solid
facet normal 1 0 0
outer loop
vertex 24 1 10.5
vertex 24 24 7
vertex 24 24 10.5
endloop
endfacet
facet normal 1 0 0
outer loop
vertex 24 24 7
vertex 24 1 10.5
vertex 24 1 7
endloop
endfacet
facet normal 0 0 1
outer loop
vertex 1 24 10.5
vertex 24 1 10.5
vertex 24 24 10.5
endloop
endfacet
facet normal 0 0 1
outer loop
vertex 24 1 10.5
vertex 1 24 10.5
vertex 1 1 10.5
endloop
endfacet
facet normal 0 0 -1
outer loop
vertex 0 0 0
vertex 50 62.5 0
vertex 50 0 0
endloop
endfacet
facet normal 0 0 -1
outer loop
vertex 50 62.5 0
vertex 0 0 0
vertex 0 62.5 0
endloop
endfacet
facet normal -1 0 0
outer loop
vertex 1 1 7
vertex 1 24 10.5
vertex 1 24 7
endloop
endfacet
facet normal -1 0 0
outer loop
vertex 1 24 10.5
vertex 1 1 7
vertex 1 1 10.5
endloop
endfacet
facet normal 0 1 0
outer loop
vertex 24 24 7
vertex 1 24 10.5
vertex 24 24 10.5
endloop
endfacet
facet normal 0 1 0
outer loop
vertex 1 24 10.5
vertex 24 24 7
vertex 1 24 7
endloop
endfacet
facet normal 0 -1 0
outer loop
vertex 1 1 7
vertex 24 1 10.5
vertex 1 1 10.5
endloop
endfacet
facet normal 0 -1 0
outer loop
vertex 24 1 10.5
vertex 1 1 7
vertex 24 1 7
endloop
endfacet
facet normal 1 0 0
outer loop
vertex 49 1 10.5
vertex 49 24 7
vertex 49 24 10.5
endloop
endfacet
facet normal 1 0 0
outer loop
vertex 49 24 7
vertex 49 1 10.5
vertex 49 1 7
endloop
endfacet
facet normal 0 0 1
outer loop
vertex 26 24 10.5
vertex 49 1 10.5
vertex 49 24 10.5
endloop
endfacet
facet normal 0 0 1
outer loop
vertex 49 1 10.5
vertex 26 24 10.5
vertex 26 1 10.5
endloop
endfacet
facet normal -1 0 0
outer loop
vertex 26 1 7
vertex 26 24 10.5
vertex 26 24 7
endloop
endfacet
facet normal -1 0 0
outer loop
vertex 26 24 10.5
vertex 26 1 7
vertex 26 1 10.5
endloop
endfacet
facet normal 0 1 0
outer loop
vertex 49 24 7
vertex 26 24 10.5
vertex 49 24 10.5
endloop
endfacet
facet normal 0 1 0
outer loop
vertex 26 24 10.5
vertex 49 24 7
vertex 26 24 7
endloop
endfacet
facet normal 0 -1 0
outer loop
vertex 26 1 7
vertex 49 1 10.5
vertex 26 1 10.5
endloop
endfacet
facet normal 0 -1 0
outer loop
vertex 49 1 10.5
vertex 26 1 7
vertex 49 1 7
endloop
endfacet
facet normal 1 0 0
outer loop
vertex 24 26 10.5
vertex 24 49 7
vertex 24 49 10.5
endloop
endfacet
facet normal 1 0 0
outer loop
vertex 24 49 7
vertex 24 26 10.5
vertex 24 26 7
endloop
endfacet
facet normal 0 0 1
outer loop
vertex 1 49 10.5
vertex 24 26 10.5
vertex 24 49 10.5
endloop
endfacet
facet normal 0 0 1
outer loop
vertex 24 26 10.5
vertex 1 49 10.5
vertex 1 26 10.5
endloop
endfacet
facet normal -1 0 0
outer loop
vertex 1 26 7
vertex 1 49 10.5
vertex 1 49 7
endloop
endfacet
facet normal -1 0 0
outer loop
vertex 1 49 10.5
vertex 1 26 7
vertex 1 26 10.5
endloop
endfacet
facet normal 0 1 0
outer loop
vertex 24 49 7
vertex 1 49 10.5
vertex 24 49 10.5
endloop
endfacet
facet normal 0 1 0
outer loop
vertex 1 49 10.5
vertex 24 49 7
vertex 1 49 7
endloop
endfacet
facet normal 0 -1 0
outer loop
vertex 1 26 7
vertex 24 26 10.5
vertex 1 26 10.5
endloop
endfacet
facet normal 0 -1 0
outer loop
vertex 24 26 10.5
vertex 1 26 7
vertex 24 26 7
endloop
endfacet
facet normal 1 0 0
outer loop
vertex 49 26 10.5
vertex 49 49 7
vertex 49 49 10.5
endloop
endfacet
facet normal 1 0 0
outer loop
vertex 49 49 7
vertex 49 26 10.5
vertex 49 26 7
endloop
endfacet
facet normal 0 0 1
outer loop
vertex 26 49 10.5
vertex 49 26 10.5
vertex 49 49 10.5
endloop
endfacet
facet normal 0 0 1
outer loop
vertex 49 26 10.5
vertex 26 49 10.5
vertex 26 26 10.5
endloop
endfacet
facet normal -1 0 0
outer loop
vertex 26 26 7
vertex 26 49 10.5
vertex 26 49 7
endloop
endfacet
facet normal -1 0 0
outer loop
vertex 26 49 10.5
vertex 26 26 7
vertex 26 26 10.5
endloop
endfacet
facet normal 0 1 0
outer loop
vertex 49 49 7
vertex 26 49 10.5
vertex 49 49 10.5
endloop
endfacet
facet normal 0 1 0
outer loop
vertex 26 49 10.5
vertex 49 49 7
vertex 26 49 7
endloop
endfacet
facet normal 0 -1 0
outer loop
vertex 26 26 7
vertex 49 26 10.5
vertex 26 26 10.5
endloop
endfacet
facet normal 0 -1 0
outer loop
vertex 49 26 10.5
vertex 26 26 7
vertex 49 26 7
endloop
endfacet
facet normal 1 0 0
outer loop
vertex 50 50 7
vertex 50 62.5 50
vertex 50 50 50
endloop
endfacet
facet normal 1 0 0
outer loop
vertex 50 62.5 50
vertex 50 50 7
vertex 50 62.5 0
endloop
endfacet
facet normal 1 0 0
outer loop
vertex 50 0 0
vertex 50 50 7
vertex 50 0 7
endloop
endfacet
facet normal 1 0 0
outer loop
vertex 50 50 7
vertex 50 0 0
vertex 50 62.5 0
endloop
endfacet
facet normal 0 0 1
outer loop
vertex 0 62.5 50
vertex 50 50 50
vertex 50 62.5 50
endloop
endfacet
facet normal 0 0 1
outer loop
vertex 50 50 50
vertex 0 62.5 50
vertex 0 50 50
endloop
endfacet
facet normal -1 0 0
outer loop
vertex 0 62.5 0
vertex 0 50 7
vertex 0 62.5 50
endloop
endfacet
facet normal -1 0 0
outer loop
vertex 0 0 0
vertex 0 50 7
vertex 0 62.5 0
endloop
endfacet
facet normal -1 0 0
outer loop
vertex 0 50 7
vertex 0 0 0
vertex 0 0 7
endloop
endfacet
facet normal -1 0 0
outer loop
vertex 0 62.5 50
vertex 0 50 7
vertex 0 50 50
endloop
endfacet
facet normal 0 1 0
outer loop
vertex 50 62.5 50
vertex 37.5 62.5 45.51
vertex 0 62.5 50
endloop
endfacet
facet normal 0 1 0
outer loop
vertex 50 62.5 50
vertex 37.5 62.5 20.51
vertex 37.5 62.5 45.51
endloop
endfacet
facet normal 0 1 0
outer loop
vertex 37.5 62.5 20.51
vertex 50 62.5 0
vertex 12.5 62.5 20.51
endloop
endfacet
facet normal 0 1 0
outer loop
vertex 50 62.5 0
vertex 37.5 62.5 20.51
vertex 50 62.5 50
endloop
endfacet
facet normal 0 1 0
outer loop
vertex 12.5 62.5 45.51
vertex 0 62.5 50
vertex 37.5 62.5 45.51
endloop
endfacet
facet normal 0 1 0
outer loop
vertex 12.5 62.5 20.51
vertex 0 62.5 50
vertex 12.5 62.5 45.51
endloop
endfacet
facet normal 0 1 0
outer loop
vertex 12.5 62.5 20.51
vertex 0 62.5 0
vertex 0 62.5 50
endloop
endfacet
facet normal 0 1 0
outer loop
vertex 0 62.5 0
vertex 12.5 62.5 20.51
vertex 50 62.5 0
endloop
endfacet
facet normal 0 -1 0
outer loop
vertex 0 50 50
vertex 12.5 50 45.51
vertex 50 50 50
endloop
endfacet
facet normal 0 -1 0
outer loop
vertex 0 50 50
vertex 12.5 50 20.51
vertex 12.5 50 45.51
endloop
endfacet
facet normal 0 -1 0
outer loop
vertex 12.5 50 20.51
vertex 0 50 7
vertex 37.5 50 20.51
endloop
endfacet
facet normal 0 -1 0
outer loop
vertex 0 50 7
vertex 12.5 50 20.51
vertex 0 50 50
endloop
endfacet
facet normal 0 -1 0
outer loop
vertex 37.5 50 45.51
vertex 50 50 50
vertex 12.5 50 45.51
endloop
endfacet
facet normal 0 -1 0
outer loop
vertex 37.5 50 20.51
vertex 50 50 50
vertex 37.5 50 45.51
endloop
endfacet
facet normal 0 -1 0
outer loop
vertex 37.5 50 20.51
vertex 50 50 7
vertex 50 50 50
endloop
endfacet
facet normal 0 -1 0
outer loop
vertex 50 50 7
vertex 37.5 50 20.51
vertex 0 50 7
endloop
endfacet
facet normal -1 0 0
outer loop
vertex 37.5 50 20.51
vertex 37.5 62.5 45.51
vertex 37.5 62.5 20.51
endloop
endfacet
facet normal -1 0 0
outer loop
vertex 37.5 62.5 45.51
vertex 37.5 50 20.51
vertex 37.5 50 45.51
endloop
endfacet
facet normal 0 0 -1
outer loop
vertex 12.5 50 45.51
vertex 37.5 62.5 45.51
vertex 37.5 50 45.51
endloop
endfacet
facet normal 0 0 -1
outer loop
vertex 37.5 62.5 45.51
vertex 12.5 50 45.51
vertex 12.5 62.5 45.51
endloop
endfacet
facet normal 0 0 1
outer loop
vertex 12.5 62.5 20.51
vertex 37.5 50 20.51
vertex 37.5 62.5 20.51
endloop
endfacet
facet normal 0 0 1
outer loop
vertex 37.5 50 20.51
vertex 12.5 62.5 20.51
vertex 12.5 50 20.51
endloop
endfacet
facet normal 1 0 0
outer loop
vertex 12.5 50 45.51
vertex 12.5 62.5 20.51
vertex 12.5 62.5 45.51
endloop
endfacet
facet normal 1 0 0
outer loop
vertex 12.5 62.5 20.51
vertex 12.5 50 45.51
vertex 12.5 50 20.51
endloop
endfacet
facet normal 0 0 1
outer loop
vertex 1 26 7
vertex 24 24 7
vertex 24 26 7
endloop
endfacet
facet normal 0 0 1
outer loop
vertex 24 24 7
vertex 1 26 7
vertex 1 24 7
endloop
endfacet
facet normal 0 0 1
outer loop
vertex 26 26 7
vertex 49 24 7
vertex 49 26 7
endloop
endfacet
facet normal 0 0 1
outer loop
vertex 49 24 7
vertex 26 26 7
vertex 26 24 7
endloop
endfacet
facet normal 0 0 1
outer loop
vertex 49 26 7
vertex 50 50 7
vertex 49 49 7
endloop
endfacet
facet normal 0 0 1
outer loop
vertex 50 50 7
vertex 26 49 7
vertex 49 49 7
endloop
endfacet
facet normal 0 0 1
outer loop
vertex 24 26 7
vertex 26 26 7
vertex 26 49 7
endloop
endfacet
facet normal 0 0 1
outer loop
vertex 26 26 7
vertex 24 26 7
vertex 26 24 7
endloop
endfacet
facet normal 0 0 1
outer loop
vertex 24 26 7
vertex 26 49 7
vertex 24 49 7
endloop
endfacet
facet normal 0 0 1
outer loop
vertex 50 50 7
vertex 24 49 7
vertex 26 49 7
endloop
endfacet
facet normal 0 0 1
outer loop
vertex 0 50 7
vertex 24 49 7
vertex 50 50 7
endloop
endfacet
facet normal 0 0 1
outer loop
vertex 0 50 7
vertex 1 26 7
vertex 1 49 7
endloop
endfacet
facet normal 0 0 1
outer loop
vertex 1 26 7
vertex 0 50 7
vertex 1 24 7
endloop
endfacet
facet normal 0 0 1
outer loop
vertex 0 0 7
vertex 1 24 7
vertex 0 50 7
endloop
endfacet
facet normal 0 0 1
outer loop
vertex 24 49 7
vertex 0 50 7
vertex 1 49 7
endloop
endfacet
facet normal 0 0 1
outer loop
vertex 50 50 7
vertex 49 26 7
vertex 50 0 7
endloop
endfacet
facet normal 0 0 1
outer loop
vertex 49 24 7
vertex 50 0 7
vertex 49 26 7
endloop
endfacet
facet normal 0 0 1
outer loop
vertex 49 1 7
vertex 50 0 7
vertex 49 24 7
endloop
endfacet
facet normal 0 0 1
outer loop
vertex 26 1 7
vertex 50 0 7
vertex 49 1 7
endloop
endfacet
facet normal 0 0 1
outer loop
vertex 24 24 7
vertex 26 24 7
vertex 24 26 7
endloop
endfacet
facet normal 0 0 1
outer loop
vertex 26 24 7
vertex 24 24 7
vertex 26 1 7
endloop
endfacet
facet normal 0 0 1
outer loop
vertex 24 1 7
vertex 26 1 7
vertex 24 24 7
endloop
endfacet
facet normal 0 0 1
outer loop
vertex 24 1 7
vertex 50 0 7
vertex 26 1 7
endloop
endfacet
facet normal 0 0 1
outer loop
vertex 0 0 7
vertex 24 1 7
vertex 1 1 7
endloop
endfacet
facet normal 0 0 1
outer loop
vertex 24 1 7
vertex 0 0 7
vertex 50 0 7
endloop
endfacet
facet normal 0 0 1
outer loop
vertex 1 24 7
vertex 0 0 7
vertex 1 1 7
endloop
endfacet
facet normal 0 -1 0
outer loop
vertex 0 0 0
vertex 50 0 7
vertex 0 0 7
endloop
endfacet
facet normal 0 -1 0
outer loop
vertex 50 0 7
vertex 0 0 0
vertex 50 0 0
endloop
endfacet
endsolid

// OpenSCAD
color("LightGray") {
    translate([1,1,0]) cube([23,23,6+4.5]);
    translate([25+1,1,0]) cube([23,23,6+4.5]);
    translate([1,25+1,0]) cube([23,23,6+4.5]);
    translate([25+1,25+1,0]) cube([23,23,6+4.5]);
}
color("Grey") {
    cube([50,50,7]);
    difference() {
        translate([0,50,0]) cube([50,12.5,50]);
        translate([12.5,25,6+4.51+10]) cube([25,50,25]);
    }
}
